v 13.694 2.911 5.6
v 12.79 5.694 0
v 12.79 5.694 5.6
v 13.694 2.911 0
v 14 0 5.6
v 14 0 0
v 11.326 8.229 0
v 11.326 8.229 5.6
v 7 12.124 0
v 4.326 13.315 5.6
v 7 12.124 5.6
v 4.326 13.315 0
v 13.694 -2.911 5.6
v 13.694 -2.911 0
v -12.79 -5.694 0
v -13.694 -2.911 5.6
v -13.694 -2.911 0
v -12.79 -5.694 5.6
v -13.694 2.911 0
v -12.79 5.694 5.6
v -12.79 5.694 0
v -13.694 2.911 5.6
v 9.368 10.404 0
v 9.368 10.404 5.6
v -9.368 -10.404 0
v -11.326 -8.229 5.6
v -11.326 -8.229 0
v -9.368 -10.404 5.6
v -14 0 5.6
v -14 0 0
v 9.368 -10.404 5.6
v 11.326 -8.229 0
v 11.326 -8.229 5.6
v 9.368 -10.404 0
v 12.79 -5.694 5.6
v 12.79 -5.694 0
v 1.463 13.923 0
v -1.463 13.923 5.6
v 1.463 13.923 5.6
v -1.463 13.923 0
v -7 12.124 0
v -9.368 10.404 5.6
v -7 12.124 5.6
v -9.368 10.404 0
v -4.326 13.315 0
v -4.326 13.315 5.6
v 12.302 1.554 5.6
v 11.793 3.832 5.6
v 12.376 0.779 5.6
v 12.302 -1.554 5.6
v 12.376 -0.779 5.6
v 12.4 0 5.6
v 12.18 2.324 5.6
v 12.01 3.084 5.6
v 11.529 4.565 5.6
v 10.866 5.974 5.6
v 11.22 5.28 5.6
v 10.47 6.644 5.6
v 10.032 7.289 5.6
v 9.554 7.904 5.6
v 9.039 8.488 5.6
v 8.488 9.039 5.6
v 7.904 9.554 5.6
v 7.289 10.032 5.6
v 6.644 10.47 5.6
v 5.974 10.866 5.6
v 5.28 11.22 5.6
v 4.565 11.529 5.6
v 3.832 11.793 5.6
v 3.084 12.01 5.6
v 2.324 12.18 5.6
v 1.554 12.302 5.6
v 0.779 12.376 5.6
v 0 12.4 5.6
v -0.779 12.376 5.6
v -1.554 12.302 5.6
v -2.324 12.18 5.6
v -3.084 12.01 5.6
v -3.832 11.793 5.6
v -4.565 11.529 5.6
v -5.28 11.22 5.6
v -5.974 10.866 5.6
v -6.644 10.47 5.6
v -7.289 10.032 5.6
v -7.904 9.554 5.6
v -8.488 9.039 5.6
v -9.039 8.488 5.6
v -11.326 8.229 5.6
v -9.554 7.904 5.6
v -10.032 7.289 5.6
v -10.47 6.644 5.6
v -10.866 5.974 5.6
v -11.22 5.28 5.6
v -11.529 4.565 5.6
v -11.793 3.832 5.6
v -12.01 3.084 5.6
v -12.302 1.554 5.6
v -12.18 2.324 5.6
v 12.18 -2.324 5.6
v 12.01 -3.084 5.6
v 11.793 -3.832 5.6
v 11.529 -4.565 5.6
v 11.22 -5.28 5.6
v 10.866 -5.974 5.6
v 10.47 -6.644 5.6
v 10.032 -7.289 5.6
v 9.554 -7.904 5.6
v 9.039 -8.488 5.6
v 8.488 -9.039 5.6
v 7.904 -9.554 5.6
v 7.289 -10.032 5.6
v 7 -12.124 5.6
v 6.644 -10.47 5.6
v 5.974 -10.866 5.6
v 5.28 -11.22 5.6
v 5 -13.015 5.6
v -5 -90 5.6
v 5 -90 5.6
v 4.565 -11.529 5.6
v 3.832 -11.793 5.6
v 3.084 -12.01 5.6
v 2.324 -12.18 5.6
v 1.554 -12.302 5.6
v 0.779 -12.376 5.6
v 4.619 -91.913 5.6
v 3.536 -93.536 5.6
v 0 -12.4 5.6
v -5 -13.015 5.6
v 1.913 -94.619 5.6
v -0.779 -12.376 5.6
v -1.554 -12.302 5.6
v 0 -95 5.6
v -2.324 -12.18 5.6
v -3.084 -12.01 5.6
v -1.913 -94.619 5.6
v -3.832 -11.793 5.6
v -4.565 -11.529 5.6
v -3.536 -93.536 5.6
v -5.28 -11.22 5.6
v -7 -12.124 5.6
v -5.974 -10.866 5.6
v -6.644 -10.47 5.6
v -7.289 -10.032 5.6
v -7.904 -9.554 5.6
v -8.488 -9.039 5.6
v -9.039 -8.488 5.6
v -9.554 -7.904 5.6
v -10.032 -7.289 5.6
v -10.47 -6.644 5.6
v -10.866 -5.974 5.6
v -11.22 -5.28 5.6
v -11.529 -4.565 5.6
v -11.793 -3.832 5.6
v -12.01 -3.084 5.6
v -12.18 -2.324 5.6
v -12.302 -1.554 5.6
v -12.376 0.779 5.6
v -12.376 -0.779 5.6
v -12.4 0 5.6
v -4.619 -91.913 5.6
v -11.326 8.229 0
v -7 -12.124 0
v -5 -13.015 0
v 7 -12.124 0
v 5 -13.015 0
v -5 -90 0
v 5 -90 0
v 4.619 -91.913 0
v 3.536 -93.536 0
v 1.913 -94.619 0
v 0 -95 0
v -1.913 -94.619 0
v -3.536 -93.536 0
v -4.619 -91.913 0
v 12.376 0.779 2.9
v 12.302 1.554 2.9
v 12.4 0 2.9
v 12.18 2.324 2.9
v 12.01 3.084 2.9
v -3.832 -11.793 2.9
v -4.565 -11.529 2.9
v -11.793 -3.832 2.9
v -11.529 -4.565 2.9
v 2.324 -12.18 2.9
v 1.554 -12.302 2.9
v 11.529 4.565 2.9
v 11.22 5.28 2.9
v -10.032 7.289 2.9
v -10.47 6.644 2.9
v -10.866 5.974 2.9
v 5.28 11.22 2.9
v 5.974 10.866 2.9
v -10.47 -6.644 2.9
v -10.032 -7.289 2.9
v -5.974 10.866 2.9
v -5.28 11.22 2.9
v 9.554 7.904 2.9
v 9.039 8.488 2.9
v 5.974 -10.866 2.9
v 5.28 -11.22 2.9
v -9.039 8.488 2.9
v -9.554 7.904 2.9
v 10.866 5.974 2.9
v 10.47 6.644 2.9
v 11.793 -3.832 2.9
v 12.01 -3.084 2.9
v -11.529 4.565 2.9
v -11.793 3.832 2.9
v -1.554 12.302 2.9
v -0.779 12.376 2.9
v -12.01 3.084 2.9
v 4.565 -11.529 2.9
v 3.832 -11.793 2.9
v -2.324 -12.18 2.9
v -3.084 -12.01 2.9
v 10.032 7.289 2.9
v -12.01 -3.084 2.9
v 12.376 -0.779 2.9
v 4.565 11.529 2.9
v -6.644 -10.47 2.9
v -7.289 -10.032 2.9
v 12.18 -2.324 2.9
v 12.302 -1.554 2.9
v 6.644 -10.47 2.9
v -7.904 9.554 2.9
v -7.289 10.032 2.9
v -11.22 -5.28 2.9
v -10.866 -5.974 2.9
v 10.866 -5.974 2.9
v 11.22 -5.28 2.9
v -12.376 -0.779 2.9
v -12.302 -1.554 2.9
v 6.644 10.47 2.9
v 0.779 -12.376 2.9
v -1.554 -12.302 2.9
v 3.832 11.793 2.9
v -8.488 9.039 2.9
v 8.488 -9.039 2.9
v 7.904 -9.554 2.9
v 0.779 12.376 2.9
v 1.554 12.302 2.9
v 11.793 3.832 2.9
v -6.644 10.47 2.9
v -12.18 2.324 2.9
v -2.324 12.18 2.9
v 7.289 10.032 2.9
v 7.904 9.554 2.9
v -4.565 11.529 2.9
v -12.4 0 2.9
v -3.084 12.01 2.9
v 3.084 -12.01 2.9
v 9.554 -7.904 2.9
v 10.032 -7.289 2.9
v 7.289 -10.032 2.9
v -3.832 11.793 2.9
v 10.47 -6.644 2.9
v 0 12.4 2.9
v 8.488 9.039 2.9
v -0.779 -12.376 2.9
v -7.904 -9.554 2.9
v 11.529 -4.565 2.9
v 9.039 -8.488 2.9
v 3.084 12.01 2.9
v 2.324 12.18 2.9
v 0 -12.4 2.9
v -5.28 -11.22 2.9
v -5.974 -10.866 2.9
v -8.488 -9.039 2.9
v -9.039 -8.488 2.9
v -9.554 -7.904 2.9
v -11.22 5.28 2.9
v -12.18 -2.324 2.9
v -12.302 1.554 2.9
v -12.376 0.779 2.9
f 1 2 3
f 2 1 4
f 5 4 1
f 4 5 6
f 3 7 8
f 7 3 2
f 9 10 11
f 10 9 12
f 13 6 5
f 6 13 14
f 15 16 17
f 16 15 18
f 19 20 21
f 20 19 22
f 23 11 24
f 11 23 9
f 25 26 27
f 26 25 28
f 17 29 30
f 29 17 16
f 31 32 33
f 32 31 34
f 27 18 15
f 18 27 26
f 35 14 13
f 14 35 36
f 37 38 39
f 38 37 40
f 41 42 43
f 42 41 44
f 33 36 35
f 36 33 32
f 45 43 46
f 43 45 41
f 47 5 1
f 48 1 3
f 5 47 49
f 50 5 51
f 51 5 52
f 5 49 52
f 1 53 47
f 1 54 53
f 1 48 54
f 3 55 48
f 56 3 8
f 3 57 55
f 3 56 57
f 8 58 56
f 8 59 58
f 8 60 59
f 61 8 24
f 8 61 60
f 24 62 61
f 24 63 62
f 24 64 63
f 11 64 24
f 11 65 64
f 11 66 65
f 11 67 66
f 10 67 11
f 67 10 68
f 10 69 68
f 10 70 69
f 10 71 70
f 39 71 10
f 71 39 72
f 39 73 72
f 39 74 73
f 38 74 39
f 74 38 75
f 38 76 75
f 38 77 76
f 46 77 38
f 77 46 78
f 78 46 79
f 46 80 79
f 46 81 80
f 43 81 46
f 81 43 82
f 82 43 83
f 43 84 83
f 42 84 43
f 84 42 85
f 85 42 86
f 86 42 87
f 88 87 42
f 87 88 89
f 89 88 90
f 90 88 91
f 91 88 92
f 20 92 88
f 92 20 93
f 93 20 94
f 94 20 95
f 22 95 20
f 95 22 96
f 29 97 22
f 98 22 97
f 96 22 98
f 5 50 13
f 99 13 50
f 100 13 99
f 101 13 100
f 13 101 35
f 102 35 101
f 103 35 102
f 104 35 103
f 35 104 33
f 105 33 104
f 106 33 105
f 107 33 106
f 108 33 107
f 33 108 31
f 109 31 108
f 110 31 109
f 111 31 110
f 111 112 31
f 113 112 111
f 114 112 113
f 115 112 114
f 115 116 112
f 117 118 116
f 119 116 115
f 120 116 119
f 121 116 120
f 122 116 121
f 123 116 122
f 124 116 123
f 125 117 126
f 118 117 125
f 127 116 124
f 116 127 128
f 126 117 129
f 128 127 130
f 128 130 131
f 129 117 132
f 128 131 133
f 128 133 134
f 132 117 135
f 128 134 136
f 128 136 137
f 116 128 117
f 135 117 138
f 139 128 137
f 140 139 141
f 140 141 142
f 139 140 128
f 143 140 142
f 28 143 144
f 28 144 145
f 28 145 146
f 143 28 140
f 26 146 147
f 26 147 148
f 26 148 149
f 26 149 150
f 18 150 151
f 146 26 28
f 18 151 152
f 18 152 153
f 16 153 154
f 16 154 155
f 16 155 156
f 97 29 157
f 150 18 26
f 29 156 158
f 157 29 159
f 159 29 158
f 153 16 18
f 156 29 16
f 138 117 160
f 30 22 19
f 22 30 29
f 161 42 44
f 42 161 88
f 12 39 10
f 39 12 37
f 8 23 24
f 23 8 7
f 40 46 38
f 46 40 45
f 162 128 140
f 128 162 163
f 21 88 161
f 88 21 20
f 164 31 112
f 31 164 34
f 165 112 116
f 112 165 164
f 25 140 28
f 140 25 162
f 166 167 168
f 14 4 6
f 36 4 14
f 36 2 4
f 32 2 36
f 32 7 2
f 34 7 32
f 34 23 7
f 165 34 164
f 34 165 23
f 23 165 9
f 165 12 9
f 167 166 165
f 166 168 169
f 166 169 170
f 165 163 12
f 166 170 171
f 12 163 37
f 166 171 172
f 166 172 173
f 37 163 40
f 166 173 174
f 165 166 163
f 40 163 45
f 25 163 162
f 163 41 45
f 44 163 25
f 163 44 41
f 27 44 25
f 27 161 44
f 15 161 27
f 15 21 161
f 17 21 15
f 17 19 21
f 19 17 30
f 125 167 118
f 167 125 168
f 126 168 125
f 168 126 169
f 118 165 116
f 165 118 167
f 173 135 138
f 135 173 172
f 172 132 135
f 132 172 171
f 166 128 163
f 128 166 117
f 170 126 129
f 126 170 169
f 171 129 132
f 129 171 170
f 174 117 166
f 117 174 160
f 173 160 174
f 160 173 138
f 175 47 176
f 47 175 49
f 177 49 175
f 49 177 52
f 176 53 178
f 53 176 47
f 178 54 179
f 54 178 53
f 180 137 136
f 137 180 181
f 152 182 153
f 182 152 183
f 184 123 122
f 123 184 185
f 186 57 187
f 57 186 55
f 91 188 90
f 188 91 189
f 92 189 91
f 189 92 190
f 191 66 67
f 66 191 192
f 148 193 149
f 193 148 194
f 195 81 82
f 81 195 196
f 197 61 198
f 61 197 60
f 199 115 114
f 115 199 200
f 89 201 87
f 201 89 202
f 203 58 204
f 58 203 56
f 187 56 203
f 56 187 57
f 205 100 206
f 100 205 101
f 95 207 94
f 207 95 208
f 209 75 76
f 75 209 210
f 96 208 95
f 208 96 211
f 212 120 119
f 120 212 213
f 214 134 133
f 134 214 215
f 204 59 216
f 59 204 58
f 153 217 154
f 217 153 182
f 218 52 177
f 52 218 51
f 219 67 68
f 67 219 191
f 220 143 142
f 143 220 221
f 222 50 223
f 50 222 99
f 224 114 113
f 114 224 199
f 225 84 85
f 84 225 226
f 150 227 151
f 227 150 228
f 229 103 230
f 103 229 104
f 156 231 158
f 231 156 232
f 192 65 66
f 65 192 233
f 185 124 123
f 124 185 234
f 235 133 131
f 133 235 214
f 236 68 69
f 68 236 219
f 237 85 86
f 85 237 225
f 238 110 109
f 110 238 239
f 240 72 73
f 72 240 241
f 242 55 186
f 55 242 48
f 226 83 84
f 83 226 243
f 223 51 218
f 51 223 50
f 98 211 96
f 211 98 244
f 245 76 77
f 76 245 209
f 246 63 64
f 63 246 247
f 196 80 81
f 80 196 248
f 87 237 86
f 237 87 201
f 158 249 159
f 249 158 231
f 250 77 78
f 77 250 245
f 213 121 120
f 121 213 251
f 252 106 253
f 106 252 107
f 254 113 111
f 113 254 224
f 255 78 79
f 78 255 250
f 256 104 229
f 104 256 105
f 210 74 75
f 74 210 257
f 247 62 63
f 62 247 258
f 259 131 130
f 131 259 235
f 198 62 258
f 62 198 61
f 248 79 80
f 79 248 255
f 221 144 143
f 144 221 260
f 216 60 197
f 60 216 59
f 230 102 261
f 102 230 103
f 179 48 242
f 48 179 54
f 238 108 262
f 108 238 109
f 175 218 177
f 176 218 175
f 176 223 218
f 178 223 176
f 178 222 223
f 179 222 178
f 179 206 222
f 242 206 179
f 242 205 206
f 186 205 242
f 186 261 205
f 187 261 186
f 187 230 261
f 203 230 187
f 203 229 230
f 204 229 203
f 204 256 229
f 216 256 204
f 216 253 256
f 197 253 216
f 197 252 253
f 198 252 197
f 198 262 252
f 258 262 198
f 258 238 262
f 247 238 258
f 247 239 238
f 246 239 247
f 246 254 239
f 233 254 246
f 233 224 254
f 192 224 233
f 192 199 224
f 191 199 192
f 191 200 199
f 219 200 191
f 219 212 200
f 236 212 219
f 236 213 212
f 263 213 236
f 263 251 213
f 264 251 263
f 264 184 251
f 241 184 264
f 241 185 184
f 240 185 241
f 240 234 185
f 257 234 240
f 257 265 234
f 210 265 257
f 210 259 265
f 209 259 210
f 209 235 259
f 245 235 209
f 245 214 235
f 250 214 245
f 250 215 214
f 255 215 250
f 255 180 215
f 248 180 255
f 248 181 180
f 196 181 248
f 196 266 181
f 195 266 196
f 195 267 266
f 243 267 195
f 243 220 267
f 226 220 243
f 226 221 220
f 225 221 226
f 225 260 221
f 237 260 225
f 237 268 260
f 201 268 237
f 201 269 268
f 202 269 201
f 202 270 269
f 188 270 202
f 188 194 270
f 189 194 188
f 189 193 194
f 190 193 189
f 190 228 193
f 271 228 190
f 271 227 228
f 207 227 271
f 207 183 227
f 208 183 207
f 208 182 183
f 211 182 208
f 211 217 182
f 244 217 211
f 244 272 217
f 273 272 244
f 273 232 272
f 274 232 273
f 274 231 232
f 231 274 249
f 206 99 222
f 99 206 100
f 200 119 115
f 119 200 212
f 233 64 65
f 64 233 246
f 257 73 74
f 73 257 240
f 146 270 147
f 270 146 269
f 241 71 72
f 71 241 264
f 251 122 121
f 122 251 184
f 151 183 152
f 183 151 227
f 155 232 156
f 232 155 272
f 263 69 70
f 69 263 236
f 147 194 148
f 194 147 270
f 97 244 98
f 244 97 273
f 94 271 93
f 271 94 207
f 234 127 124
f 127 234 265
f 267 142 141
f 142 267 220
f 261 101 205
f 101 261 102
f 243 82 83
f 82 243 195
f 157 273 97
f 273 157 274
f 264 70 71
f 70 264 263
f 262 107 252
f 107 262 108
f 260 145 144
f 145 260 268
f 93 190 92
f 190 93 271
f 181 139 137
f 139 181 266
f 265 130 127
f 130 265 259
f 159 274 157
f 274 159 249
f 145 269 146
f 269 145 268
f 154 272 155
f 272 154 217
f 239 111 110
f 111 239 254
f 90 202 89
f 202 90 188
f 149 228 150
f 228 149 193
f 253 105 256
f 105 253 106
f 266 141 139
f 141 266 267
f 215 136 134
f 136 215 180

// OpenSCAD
thicknessOfMetal = 2.7;
diameterOfMetal = 24;
stickLength = 90;
heightPadding=2.9;

difference() {
    union() {
        cylinder (r=diameterOfMetal/2+2, h=thicknessOfMetal+heightPadding);
        /* Stick */
        hull() {
            cylinder(r=5, h=thicknessOfMetal+heightPadding);
            translate([0,-stickLength,0]) {
                cylinder(r=5, h=thicknessOfMetal+heightPadding);
            }
        }
        
    }
    translate([0,0,heightPadding == 0 ? -0.05 : heightPadding]) {
        cylinder(r=diameterOfMetal/2+0.4, h=thicknessOfMetal+2, $fn=100);
    }
}
